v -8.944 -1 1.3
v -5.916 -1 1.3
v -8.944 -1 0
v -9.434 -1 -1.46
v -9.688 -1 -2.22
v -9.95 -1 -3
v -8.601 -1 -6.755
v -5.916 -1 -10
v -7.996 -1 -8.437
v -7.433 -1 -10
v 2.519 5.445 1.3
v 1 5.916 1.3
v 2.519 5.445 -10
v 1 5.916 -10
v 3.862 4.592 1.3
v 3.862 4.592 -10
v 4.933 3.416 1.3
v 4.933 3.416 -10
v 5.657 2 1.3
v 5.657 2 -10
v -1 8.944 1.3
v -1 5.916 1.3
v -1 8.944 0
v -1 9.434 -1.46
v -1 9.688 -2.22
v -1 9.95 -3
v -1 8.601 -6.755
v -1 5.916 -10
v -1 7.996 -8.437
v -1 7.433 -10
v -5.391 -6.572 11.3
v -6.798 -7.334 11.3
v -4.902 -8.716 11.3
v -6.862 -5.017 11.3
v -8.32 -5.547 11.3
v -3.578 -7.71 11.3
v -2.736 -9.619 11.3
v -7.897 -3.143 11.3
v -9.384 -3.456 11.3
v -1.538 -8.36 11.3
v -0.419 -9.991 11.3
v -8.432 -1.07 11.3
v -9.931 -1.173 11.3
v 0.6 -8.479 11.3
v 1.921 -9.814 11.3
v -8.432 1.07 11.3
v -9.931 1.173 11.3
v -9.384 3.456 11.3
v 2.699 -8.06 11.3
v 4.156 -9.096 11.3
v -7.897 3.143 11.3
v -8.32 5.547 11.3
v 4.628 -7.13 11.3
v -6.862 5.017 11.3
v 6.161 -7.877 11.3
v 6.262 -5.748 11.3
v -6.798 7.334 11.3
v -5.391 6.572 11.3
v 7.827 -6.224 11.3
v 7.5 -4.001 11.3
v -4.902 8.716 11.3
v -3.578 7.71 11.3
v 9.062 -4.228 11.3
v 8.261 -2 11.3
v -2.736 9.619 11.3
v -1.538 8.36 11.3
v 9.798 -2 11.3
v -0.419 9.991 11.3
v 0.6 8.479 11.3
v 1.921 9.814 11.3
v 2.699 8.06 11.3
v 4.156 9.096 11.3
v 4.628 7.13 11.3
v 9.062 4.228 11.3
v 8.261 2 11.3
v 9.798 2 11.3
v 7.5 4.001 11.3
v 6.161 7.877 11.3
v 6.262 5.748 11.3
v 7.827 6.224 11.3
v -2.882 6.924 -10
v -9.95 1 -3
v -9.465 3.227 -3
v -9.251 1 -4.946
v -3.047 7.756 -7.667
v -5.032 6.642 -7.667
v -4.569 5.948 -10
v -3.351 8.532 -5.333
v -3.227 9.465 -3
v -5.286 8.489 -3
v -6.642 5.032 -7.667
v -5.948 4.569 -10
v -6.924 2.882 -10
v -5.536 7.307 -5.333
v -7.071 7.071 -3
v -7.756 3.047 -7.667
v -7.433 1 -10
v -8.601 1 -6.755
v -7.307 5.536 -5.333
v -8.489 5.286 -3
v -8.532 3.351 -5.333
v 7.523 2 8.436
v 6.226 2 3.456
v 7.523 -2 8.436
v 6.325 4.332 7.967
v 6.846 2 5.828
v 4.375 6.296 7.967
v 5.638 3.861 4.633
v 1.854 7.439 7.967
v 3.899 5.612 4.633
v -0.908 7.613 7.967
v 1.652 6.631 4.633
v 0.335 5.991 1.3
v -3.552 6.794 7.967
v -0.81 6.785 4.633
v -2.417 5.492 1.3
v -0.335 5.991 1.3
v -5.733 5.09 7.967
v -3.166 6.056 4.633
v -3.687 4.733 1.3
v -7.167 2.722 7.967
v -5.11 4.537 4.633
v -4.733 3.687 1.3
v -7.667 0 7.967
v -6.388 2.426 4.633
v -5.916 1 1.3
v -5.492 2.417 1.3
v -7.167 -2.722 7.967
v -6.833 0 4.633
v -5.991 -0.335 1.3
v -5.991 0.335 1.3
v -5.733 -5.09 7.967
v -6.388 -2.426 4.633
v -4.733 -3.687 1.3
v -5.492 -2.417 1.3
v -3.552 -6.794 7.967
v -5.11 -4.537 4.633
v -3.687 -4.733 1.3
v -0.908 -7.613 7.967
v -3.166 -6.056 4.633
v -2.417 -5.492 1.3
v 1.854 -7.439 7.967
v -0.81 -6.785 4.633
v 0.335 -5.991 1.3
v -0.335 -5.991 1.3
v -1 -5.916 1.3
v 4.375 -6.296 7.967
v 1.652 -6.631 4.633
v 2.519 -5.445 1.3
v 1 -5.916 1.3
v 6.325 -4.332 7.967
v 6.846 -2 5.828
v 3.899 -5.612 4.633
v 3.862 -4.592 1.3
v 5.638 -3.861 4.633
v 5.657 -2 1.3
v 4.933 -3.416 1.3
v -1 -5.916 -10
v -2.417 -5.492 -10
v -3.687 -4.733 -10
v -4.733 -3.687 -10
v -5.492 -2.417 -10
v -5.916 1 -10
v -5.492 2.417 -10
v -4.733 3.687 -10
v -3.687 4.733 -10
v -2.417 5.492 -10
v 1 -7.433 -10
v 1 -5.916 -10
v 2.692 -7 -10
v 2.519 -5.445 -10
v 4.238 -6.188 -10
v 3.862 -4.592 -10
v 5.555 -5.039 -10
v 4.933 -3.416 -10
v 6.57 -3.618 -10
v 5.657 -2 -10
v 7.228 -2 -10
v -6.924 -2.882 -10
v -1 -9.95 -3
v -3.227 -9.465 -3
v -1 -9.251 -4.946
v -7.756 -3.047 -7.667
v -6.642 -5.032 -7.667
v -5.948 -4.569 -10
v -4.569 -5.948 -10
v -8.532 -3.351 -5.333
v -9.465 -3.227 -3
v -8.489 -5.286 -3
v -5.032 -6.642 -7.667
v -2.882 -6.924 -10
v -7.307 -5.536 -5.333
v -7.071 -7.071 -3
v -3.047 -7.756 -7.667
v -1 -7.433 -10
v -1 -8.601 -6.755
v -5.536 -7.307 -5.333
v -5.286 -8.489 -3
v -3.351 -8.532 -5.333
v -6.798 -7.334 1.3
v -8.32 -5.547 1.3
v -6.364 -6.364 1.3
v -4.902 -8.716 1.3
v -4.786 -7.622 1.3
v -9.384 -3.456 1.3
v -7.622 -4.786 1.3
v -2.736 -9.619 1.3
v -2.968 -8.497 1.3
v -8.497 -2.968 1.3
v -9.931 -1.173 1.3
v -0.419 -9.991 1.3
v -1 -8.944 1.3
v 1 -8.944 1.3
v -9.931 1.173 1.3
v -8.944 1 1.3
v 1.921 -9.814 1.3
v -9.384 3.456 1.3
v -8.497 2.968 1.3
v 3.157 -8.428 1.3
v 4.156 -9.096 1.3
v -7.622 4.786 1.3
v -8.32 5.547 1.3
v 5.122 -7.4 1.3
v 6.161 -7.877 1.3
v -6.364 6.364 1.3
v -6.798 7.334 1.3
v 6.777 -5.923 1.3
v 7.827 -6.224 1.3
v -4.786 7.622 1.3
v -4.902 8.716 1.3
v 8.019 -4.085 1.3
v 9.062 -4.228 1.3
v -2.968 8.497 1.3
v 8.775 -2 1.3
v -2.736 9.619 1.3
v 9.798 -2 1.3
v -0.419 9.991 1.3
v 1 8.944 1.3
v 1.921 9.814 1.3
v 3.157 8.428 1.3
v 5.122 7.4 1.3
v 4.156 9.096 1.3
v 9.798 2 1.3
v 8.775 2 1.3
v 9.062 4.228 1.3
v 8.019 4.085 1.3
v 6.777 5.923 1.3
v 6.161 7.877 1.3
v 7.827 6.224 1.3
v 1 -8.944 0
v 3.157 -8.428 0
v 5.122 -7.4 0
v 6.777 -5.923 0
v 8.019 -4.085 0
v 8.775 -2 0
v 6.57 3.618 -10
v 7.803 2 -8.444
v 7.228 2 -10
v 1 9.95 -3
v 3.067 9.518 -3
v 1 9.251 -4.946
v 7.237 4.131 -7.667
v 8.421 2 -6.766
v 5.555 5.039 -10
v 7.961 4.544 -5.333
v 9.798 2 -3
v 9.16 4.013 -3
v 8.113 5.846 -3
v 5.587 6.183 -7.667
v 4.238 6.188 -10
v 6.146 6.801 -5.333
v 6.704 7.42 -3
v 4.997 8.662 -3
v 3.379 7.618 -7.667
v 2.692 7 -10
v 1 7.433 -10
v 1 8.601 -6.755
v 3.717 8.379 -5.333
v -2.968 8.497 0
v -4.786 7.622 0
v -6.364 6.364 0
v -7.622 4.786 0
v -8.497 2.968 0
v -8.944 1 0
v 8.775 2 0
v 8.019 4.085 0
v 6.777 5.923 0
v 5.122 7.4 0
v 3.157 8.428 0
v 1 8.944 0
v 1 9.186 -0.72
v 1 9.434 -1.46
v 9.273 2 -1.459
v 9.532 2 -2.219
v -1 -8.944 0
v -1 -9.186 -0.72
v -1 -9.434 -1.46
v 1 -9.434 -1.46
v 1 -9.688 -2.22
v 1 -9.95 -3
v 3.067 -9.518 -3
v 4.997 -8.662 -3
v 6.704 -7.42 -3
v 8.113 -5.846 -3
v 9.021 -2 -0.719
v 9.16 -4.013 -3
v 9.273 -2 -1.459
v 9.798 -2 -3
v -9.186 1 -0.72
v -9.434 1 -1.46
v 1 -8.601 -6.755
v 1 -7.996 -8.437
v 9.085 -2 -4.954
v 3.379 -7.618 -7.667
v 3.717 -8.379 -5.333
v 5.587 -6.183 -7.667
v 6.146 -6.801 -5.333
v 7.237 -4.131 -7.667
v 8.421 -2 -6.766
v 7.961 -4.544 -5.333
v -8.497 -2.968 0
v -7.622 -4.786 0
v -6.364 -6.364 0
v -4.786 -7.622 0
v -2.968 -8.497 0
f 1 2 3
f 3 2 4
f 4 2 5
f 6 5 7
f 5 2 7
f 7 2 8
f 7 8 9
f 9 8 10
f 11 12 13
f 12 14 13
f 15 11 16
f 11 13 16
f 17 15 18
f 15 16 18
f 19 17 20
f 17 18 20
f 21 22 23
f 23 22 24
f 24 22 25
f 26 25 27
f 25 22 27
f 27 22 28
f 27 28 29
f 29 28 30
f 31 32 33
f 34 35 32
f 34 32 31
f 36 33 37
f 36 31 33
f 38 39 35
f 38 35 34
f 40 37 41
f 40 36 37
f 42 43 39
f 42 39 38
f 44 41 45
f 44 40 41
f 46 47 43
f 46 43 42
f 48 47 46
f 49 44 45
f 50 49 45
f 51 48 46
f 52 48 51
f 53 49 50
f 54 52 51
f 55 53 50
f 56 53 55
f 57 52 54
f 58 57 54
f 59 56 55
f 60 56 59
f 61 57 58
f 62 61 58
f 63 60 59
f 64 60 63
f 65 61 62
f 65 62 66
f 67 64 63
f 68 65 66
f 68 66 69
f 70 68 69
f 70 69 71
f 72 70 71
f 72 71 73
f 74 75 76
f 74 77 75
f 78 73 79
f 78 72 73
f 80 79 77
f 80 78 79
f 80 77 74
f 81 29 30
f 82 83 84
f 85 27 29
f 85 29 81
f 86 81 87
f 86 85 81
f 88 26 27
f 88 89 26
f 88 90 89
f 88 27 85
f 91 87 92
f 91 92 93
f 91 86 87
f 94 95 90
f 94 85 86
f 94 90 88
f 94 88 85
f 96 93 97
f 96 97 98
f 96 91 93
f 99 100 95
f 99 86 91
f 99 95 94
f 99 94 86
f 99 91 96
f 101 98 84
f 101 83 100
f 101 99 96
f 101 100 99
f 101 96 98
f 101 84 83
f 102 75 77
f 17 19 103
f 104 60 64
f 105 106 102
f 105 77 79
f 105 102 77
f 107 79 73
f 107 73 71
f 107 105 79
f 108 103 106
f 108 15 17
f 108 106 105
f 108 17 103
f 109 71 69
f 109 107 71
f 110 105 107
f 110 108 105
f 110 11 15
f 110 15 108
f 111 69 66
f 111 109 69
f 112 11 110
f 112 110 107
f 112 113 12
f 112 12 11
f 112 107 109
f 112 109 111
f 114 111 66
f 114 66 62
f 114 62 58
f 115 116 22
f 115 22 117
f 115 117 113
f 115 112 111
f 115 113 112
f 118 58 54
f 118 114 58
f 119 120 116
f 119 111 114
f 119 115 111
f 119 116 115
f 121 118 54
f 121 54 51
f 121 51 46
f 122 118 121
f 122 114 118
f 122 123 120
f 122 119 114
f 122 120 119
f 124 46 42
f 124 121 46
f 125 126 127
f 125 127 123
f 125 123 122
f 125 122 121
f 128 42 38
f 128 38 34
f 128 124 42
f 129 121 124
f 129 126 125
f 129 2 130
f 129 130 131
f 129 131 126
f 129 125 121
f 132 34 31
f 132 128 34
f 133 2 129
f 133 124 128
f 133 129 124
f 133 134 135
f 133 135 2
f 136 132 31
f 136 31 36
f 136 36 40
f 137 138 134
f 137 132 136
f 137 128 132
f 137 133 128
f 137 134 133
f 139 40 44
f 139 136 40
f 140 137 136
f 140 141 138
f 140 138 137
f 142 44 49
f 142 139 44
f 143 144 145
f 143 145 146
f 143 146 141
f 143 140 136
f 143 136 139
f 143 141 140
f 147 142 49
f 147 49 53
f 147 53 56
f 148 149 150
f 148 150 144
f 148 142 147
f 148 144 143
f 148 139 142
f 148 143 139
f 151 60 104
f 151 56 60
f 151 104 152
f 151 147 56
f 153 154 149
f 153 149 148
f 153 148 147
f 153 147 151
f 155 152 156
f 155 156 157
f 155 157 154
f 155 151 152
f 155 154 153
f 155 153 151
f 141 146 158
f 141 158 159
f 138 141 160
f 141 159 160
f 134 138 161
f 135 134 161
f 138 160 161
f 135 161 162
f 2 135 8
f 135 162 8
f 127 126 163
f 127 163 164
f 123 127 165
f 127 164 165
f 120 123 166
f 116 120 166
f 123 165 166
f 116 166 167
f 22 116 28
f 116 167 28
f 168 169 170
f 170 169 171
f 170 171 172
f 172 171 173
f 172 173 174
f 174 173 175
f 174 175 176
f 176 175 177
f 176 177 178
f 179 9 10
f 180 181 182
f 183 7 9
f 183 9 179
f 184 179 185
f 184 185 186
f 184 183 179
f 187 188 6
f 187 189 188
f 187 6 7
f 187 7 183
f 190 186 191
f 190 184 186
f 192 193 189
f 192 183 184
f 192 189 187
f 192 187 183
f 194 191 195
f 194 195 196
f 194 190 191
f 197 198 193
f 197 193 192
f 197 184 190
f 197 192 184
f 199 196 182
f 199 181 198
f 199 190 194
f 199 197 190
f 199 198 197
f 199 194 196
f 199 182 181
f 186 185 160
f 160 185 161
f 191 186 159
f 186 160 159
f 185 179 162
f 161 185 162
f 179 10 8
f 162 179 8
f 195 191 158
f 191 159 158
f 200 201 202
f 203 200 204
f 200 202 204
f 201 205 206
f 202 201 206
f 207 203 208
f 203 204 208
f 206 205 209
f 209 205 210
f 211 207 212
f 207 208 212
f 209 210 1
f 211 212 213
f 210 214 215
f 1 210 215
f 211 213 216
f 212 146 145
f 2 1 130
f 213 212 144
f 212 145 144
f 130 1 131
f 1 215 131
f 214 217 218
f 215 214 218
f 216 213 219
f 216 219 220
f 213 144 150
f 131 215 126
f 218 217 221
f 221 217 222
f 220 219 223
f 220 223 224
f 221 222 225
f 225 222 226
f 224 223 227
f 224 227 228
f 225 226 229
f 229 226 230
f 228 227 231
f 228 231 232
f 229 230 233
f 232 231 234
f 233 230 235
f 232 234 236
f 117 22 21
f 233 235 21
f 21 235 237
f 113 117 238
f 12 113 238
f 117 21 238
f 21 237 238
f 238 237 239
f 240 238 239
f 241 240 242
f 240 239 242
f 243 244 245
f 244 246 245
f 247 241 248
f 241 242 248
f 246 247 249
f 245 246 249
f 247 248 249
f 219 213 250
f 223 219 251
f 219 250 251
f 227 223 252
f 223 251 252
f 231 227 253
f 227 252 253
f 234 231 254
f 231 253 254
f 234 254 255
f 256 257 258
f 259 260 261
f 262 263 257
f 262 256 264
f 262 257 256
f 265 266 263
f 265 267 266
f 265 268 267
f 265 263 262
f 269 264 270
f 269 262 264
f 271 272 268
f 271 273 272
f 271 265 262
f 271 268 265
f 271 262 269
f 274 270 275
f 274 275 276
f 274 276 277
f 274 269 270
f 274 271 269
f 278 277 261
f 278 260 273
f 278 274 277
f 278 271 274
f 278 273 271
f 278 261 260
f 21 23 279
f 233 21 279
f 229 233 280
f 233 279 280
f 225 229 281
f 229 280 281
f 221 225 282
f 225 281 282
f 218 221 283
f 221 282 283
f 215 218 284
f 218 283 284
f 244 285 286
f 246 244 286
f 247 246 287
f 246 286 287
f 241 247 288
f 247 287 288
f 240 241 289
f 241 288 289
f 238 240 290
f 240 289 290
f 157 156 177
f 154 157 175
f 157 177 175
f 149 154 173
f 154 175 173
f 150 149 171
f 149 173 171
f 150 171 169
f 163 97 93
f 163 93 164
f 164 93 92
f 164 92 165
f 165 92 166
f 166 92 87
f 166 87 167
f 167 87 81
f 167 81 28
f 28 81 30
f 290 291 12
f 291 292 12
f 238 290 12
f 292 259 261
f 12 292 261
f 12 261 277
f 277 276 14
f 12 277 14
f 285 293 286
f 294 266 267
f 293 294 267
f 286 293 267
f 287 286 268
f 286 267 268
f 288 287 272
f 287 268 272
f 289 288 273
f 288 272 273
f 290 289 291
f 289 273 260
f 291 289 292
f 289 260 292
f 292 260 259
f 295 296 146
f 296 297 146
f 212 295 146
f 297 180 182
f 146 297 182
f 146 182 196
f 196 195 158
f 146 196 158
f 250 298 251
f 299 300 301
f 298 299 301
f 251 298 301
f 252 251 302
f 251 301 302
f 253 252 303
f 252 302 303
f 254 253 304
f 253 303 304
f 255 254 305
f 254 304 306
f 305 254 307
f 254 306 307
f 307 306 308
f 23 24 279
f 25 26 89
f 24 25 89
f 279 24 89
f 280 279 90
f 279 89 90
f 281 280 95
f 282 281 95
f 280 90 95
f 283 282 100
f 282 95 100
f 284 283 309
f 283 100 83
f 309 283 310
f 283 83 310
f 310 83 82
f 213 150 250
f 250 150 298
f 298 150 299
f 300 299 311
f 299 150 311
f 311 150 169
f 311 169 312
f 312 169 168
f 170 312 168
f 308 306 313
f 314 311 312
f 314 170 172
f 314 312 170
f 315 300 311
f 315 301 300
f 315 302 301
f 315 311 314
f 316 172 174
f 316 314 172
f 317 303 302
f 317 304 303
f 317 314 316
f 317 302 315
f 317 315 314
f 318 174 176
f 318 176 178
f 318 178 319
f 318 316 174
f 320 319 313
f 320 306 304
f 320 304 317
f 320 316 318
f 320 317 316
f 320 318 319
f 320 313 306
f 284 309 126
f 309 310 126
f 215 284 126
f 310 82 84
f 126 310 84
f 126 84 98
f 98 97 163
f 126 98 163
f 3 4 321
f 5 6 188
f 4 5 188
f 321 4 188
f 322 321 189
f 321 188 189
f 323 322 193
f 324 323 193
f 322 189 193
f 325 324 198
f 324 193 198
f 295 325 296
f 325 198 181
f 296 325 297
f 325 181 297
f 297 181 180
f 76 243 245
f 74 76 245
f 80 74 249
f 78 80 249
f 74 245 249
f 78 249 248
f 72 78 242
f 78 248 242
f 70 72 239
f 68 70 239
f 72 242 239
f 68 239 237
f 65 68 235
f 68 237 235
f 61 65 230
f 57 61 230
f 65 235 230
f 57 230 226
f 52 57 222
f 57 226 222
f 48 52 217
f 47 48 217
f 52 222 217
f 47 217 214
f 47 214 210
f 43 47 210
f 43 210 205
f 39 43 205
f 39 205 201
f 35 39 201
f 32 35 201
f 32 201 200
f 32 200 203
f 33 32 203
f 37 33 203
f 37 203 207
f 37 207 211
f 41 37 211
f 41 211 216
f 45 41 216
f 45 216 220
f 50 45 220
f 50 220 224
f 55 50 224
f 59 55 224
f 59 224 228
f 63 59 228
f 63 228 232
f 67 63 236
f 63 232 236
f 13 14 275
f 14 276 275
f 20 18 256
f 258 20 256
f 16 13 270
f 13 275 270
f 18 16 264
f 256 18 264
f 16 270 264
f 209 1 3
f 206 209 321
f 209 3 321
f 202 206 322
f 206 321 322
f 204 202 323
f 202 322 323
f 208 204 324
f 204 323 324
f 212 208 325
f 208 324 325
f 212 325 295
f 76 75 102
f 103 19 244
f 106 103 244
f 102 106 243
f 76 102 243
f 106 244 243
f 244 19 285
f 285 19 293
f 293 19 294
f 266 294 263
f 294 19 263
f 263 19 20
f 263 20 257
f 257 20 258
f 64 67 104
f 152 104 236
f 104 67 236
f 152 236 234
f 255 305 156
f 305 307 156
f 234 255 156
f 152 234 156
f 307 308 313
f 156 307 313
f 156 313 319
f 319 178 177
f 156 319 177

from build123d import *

# Parameters (mm, degrees)
F6_R       = 7.5
F3_R       = 10
F0_R       = 9
F7_FACE_R  = 10
F9_DEPTH   = 1.3
F11_R      = 10
F11_R_2    = 9
F12_DEPTH  = 10
F10_R      = 6
F14_DEPTH  = 11.3
F15_R      = 8.5
F14_FACE_R = 6
F13_W      = 2
F13_H      = 2
F17_DEPTH  = 11.3
F18_DEPTH  = 21.3010001


with BuildPart() as f7:
    # F6 (on plane+point) → F7 section 0
    with BuildSketch(Plane.XY.offset(-10)):
        Circle(F6_R)
    # F3 (on plane+point) → F7 section 1
    with BuildSketch(Plane.XY.offset(-3)):
        Circle(F3_R)
    loft()

    # F0 (on Top) → F8 section 0
    with BuildSketch(Plane.XY):
        Circle(F0_R)
    # F7_face (on face) → F8 section 1
    with BuildSketch(Plane.XY.offset(-3)):
        Circle(F7_FACE_R)
    loft()

    # F9 (add): a face of the model
    f9_faces = [f7.faces().sort_by_distance(p)[0] for p in [
        (0, 0, 0),
    ]]
    extrude(f9_faces, amount=F9_DEPTH)

    # F11 (on face) → F12 (join)
    with BuildSketch(Plane.XY.offset(1.3)):
        Circle(F11_R)
        Circle(F11_R_2, mode=Mode.SUBTRACT)
        Circle(F11_R_2)
    extrude(amount=F12_DEPTH)

    # F10 (on face) → F14 (cut, through all)
    with BuildSketch(Plane(origin=(0, 0, -10), x_dir=(1, 0, 0), z_dir=(0, 0, -1))):
        Circle(F10_R)
    extrude(amount=-F14_DEPTH, mode=Mode.SUBTRACT)

    # F15 (on face) → F16 section 0
    with BuildSketch(Plane.XY.offset(11.3)):
        Circle(F15_R)
    # F14_face (on face) → F16 section 1
    with BuildSketch(Plane(origin=(0, 0, 1.3), x_dir=(1, 0, 0), z_dir=(0, 0, -1))):
        Circle(F14_FACE_R)
    loft(mode=Mode.SUBTRACT)

    # F13 (on face) → F17 (cut, through all)
    with BuildSketch(Plane(origin=(0, 0, -10), x_dir=(1, 0, 0), z_dir=(0, 0, -1))):
        with BuildLine():
            Line((-1, 15), (-1, 7.4330343737))
            ThreePointArc((-1, 7.4330343737), (0, 7.5), (1, 7.4330343737))
            Line((1, 7.4330343737), (1, 15))
            Line((1, 15), (-1, 15))
        make_face()
        with BuildLine():
            Line((-1, 7.4330343737), (-1, 1))
            Line((-1, 1), (1, 1))
            Line((1, 1), (1, 2))
            Line((1, 2), (1, 7.4330343737))
            ThreePointArc((1, 7.4330343737), (0, 7.5), (-1, 7.4330343737))
        make_face()
        with BuildLine():
            Line((15, 1), (7.4330343737, 1))
            ThreePointArc((7.4330343737, 1), (7.4832398666, 0.5011198447), (7.5, 0))
            ThreePointArc((7.5, 0), (7.4832398666, -0.5011198447), (7.4330343737, -1))
            Line((7.4330343737, -1), (15, -1))
            Line((15, -1), (15, 1))
        make_face()
        with BuildLine():
            Line((7.4330343737, 1), (1, 1))
            Line((1, 1), (1, -1))
            Line((1, -1), (7.4330343737, -1))
            ThreePointArc((7.4330343737, -1), (7.4832398666, -0.5011198447), (7.5, 0))
            ThreePointArc((7.5, 0), (7.4832398666, 0.5011198447), (7.4330343737, 1))
        make_face()
        with BuildLine():
            Line((-7.4330343737, 1), (-15, 1))
            Line((-15, 1), (-15, -1))
            Line((-15, -1), (-7.4330343737, -1))
            ThreePointArc((-7.4330343737, -1), (-7.5, 0), (-7.4330343737, 1))
        make_face()
        with BuildLine():
            Line((-1, 1), (-7.4330343737, 1))
            ThreePointArc((-7.4330343737, 1), (-7.5, 0), (-7.4330343737, -1))
            Line((-7.4330343737, -1), (-1, -1))
            Line((-1, -1), (-1, 1))
        make_face()
        Rectangle(F13_W, F13_H)
        with BuildLine():
            Line((1, -1), (-1, -1))
            Line((-1, -1), (-1, -7.4330343737))
            ThreePointArc((-1, -7.4330343737), (0, -7.5), (1, -7.4330343737))
            Line((1, -7.4330343737), (1, -2))
            Line((1, -2), (1, -1))
        make_face()
        with BuildLine():
            ThreePointArc((1, -7.4330343737), (0, -7.5), (-1, -7.4330343737))
            Line((-1, -7.4330343737), (-1, -15))
            Line((-1, -15), (1, -15))
            Line((1, -15), (1, -7.4330343737))
        make_face()
    extrude(amount=-F17_DEPTH, mode=Mode.SUBTRACT)

    # F13 (on face) → F18 (cut, through all)
    with BuildSketch(Plane(origin=(0, 0, -10), x_dir=(1, 0, 0), z_dir=(0, 0, -1))):
        with BuildLine():
            Line((7.4330343737, -1), (1, -1))
            Line((1, -1), (1, -2))
            Line((1, -2), (7.2284161474, -2))
            ThreePointArc((7.2284161474, -2), (7.3477569942, -1.5034850031), (7.4330343737, -1))
        make_face()
        with BuildLine():
            Line((7.4330343737, 1), (1, 1))
            Line((1, 1), (1, -1))
            Line((1, -1), (7.4330343737, -1))
            ThreePointArc((7.4330343737, -1), (7.4832398666, -0.5011198447), (7.5, 0))
            ThreePointArc((7.5, 0), (7.4832398666, 0.5011198447), (7.4330343737, 1))
        make_face()
        with BuildLine():
            Line((1, 2), (1, 1))
            Line((1, 1), (7.4330343737, 1))
            ThreePointArc((7.4330343737, 1), (7.3477569942, 1.5034850031), (7.2284161474, 2))
            Line((7.2284161474, 2), (1, 2))
        make_face()
        with BuildLine():
            ThreePointArc((7.2284161474, 2), (7.3477569942, 1.5034850031), (7.4330343737, 1))
            Line((7.4330343737, 1), (15, 1))
            Line((15, 1), (15, 2))
            Line((15, 2), (7.2284161474, 2))
        make_face()
        with BuildLine():
            Line((15, 1), (7.4330343737, 1))
            ThreePointArc((7.4330343737, 1), (7.4832398666, 0.5011198447), (7.5, 0))
            ThreePointArc((7.5, 0), (7.4832398666, -0.5011198447), (7.4330343737, -1))
            Line((7.4330343737, -1), (15, -1))
            Line((15, -1), (15, 1))
        make_face()
        with BuildLine():
            Line((15, -1), (7.4330343737, -1))
            ThreePointArc((7.4330343737, -1), (7.3477569942, -1.5034850031), (7.2284161474, -2))
            Line((7.2284161474, -2), (15, -2))
            Line((15, -2), (15, -1))
        make_face()
    extrude(amount=-F18_DEPTH, mode=Mode.SUBTRACT)


solid = f7.part
